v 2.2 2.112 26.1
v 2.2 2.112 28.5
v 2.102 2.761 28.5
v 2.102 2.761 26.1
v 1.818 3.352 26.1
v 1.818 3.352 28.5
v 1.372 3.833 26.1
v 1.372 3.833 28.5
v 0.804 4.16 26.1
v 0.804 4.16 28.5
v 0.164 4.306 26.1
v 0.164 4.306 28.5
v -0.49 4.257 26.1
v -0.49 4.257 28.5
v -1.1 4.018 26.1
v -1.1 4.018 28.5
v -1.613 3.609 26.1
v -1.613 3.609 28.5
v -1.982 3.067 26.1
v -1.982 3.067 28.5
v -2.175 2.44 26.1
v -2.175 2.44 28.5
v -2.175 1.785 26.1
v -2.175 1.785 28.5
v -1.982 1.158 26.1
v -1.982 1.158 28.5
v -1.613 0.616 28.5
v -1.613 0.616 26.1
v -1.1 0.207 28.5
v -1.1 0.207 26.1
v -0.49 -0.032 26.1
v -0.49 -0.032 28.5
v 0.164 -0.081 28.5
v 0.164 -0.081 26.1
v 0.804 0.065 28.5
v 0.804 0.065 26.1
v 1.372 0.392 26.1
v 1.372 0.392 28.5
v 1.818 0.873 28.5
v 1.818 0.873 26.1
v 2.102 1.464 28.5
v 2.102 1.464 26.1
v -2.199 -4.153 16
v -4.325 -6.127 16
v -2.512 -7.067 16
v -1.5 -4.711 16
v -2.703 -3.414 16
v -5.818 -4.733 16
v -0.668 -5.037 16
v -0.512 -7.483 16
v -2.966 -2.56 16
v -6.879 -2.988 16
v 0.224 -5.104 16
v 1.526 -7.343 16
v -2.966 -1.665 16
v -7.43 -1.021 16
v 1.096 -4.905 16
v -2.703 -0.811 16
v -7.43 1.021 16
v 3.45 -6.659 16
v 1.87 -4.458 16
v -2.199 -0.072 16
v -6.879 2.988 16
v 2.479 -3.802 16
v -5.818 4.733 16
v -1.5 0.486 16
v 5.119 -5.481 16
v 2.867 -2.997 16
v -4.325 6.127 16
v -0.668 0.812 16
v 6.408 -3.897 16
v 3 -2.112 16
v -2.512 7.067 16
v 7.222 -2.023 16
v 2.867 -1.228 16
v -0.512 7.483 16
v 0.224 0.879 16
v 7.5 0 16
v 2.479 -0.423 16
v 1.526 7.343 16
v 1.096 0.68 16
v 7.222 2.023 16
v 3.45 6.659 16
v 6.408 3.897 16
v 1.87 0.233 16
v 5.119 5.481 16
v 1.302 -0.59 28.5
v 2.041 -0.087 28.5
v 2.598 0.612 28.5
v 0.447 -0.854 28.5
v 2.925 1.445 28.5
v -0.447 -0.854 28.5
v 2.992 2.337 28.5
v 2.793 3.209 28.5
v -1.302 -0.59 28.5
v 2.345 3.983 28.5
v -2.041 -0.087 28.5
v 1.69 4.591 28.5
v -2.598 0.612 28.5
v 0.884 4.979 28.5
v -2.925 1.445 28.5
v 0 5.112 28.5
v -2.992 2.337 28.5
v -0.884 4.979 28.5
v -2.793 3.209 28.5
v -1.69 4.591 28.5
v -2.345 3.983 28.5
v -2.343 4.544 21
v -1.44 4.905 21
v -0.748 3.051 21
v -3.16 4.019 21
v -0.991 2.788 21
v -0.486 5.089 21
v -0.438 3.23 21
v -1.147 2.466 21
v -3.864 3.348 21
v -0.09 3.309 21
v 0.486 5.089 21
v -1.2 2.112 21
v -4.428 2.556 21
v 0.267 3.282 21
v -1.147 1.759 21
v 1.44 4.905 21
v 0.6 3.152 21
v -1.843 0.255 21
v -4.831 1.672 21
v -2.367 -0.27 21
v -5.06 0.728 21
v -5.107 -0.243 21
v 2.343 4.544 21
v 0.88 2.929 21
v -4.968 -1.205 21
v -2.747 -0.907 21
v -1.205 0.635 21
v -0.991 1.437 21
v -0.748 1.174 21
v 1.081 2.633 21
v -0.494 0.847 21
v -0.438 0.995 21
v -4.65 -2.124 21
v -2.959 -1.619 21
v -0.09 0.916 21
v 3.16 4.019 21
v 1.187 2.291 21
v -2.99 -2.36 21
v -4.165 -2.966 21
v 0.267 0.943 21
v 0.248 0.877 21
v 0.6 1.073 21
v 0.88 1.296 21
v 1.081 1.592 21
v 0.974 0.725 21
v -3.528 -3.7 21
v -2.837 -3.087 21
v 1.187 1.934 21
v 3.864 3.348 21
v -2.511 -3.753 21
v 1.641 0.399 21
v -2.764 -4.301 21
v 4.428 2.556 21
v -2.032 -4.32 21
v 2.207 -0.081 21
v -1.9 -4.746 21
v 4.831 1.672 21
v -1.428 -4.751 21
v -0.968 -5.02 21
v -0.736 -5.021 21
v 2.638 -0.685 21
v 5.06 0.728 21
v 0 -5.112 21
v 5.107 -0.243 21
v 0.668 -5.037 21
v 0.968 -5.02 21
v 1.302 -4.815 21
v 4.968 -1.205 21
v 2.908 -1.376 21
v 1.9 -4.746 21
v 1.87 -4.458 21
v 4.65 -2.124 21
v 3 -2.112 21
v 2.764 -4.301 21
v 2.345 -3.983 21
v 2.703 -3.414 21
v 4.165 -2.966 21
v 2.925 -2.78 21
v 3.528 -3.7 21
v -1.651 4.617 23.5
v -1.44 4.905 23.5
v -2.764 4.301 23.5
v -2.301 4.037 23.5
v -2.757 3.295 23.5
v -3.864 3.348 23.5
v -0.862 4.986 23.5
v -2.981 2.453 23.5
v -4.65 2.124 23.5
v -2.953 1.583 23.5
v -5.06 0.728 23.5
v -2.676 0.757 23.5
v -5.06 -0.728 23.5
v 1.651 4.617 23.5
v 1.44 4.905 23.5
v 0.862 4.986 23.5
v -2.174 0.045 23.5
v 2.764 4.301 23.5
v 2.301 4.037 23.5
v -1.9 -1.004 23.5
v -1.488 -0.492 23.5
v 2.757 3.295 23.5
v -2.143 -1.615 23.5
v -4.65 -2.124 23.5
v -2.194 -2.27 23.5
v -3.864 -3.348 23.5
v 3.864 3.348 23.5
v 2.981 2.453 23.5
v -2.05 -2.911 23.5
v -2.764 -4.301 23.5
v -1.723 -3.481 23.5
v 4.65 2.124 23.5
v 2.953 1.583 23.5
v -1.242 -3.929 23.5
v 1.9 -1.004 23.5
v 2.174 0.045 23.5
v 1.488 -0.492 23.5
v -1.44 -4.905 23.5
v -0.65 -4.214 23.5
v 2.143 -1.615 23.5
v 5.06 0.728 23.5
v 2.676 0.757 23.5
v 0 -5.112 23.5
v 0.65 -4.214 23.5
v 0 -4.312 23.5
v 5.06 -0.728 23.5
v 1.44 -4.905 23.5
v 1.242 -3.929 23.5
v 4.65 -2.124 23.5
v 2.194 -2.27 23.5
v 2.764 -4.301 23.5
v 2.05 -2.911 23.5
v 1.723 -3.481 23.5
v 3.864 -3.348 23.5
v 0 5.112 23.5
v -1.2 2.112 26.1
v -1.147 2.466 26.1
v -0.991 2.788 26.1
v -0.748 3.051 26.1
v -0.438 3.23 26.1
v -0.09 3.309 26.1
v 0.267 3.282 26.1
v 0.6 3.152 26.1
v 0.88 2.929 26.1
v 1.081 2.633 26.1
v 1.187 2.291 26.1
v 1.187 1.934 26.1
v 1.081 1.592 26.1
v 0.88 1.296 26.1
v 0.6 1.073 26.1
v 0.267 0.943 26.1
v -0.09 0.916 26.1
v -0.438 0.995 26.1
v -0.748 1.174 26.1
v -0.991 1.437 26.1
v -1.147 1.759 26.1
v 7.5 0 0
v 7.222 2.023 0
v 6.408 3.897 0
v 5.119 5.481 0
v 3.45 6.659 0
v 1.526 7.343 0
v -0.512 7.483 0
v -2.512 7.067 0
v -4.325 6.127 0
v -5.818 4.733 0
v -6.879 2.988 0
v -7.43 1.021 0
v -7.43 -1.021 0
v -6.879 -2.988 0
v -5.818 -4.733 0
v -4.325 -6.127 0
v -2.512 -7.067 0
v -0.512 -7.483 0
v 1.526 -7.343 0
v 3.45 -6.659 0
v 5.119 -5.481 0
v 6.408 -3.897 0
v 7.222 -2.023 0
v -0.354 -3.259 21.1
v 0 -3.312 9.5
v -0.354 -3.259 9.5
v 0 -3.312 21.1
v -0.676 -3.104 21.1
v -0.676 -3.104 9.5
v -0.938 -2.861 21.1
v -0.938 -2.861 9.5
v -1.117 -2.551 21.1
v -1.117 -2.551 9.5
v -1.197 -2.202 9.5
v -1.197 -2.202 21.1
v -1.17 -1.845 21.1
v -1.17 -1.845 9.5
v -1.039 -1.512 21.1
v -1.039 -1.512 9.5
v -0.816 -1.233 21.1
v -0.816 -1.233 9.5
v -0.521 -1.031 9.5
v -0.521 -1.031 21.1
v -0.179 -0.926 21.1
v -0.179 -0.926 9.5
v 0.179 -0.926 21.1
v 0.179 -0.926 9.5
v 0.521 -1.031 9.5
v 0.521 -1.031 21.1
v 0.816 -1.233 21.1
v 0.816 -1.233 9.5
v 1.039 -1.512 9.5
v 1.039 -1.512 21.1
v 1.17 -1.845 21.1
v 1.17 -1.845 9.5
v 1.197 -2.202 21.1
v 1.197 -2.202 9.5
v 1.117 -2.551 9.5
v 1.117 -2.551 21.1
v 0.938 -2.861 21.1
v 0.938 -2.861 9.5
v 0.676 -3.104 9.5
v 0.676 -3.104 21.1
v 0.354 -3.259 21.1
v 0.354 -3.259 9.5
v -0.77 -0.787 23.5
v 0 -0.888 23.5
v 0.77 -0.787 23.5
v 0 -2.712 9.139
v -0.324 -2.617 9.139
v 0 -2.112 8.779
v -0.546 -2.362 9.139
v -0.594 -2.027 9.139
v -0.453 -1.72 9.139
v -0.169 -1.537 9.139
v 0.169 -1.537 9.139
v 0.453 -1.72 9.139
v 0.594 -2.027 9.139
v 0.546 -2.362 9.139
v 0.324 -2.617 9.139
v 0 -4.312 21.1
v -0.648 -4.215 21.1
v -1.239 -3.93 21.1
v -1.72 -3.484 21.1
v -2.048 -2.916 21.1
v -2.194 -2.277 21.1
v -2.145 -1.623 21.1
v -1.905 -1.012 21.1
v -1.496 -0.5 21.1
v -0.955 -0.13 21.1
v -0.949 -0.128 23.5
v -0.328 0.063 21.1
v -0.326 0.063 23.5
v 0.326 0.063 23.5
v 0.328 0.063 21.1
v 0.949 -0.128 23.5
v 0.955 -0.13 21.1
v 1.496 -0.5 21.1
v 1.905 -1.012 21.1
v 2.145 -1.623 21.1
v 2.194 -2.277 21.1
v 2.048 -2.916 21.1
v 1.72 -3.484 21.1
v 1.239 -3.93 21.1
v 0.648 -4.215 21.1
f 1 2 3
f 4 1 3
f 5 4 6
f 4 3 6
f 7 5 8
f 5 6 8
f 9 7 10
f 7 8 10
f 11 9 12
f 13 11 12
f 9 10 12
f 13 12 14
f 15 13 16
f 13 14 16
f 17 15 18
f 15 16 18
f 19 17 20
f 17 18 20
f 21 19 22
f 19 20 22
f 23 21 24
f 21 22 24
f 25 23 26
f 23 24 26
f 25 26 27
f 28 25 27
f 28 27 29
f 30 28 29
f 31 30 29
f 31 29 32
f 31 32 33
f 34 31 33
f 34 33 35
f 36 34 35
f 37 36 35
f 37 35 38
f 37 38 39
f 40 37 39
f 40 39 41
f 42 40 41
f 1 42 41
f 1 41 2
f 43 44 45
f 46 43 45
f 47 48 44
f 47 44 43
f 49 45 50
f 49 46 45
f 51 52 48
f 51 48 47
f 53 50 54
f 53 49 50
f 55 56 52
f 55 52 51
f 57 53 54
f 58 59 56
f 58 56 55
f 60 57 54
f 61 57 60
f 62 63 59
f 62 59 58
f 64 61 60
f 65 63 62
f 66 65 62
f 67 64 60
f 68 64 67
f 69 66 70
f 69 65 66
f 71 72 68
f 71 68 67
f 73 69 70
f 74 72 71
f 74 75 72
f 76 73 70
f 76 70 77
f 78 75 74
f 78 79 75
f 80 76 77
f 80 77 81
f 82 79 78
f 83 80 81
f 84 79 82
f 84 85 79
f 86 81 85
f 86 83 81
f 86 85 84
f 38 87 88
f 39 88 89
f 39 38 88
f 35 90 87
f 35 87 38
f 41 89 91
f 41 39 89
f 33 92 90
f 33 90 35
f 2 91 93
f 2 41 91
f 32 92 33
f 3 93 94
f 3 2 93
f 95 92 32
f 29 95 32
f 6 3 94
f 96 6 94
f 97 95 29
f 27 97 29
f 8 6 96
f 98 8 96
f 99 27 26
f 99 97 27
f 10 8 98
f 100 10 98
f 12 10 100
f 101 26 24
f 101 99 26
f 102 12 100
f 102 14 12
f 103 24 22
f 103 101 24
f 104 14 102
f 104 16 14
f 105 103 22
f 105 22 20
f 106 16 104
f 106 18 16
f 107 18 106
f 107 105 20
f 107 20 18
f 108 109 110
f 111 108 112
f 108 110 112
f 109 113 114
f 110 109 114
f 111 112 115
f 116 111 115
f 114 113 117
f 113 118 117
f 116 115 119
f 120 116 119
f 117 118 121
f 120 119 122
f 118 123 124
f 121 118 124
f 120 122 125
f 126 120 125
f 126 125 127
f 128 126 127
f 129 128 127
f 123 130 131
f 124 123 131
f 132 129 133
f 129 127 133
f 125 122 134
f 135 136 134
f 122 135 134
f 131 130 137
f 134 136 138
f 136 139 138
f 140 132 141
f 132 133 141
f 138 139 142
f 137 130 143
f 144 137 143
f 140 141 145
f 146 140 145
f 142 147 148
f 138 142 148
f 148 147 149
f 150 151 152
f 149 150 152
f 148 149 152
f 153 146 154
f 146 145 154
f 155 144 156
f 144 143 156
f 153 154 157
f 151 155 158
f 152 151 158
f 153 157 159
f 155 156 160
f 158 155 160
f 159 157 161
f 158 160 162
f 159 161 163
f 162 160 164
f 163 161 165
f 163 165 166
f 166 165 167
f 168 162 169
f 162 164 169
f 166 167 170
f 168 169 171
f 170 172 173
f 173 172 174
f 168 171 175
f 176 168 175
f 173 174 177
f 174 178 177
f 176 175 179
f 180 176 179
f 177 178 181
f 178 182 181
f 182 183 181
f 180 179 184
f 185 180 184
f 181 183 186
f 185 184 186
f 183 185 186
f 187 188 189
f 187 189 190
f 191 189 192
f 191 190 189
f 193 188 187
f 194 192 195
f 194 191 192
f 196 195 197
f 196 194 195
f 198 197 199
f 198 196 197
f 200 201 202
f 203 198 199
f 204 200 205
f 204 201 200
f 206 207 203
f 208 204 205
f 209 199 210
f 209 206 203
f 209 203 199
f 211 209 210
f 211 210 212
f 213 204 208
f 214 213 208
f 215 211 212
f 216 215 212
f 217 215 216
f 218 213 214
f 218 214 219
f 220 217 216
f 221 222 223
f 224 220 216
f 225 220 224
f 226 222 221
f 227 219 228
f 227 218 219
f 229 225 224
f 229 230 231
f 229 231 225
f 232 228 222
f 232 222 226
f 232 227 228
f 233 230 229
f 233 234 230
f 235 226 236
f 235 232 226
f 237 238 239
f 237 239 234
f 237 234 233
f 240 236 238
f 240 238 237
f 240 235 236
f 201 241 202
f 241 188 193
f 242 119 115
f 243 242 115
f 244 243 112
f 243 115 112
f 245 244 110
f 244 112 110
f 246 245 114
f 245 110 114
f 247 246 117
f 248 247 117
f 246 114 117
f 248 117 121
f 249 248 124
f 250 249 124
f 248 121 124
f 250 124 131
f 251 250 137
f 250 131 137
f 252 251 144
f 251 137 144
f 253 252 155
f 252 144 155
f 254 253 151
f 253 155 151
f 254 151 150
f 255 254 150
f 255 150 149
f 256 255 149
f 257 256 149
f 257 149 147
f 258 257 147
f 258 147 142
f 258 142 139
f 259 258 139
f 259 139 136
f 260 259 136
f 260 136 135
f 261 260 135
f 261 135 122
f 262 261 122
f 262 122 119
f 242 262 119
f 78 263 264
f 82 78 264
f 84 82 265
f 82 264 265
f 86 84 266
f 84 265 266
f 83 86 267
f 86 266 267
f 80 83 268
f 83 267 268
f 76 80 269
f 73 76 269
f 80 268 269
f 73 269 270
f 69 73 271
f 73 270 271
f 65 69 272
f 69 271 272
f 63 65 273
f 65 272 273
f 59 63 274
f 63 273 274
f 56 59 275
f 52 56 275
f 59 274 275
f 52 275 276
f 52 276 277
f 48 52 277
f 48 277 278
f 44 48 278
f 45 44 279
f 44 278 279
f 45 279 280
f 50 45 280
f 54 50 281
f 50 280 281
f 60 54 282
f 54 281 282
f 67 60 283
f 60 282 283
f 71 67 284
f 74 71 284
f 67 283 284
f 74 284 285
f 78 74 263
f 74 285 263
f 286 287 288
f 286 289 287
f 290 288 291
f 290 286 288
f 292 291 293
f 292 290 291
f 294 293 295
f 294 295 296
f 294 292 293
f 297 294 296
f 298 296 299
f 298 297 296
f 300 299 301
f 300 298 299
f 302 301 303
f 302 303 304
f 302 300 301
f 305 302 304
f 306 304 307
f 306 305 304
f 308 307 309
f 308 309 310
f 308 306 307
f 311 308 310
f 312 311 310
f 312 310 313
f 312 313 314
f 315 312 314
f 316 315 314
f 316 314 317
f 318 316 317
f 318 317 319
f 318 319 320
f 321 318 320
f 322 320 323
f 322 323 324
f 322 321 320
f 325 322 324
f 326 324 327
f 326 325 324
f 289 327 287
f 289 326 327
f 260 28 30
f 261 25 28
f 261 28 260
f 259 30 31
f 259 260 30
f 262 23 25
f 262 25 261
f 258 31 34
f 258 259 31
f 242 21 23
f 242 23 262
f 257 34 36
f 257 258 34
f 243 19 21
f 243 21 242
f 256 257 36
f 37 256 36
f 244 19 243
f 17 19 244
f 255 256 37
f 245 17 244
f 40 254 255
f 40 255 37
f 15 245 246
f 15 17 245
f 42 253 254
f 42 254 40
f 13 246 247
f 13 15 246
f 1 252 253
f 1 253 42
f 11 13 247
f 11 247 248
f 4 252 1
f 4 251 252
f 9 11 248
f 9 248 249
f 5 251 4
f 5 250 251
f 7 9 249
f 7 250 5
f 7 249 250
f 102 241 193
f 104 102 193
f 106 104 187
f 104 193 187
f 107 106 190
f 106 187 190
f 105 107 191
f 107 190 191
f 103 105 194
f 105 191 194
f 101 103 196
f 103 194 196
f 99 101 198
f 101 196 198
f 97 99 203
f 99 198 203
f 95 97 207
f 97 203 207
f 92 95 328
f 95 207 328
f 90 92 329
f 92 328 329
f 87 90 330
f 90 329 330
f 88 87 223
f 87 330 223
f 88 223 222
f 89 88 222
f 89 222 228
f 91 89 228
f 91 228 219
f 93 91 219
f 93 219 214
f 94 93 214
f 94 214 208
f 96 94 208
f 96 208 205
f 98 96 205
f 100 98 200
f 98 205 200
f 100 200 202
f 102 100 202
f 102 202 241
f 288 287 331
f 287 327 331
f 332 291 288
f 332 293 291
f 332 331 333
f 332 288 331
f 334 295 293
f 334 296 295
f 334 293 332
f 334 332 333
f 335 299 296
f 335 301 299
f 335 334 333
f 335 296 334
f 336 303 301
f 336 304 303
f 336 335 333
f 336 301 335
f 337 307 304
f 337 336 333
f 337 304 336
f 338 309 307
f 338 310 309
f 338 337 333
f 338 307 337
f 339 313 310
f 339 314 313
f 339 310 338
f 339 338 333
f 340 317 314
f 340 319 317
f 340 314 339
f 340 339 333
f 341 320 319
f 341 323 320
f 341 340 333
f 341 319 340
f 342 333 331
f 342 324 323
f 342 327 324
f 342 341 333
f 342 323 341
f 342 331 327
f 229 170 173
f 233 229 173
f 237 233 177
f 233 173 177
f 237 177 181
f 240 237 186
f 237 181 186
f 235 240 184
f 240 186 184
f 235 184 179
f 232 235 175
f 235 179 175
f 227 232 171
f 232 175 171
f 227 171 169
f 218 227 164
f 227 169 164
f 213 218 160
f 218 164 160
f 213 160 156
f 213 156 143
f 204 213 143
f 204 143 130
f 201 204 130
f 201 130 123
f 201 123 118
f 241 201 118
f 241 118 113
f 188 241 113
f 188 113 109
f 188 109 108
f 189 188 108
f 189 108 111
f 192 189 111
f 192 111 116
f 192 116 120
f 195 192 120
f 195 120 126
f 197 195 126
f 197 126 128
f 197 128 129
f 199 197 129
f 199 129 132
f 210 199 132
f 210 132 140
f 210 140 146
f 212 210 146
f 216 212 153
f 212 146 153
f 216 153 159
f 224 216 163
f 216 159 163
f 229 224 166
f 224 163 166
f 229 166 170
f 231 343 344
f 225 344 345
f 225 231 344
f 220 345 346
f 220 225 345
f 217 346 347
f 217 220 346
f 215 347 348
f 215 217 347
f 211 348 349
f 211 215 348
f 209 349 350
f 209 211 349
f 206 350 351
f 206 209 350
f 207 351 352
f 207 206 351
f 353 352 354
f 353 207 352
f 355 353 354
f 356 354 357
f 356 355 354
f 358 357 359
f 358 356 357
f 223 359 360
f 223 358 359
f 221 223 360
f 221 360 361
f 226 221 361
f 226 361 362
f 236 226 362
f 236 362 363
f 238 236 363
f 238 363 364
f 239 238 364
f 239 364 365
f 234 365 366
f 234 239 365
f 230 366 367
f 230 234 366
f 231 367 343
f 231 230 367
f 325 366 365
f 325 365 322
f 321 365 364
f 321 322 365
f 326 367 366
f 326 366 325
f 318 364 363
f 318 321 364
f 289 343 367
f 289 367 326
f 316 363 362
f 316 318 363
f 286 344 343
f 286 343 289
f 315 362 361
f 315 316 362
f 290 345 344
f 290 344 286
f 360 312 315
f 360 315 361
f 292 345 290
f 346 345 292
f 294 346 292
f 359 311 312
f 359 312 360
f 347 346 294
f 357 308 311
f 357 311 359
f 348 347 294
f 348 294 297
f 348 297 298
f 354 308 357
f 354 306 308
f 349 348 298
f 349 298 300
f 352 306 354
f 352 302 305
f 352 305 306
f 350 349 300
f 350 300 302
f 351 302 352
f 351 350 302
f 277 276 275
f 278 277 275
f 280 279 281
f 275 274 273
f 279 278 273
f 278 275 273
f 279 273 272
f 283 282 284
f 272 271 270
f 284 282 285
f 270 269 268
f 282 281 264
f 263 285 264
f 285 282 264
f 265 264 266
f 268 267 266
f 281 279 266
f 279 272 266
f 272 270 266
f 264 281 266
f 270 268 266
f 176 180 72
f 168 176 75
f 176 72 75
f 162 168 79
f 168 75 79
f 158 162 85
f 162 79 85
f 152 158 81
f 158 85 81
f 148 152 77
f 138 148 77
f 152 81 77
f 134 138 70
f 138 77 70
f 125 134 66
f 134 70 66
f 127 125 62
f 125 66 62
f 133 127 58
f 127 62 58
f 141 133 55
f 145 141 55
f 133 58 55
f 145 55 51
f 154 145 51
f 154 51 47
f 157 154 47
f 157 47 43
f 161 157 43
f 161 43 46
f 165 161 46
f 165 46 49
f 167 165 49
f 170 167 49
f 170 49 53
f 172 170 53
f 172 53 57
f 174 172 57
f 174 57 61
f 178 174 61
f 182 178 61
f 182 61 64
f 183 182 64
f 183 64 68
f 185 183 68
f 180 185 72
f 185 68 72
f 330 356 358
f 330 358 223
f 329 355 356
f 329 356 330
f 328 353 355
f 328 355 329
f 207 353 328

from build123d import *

# Parameters (mm, degrees)
SKETCH1_R                                           = 7.5
BOSS_EXTRUDE1_DEPTH                                 = 16
SKETCH2_R                                           = 3
BOSS_EXTRUDE2_DEPTH                                 = 5
SKETCH3_R                                           = 5.1125
BOSS_EXTRUDE3_DEPTH                                 = 2.5
SKETCH5_R                                           = 3
BOSS_EXTRUDE4_DEPTH                                 = 5
CBORE_FOR_M2_HEX_SOCKET_HEAD_CAP_SCREW1_D           = 2.4
CBORE_FOR_M2_HEX_SOCKET_HEAD_CAP_SCREW1_DEPTH       = 7.5
CBORE_FOR_M2_HEX_SOCKET_HEAD_CAP_SCREW1_CBORE_D     = 4.4
CBORE_FOR_M2_HEX_SOCKET_HEAD_CAP_SCREW1_CBORE_DEPTH = 2.4


with BuildPart() as part:
    # Sketch1 → Boss-Extrude1 (new body)
    with BuildSketch(Plane.XY):
        Circle(SKETCH1_R)
    extrude(amount=BOSS_EXTRUDE1_DEPTH)

    # Sketch2 → Boss-Extrude2 (add)
    with BuildSketch(Plane.XY.offset(16)):
        with Locations((0, -2.1125)):
            Circle(SKETCH2_R)
    extrude(amount=BOSS_EXTRUDE2_DEPTH)

    # Sketch3 → Boss-Extrude3 (add)
    with BuildSketch(Plane.XY.offset(21)):
        with Locations(Location((0, 0, 0), (0, 0, 270))):
            Circle(SKETCH3_R)
    extrude(amount=BOSS_EXTRUDE3_DEPTH)

    # Sketch5 → Boss-Extrude4 (add)
    with BuildSketch(Plane.XY.offset(23.5)):
        with Locations(Location((0, 2.1125, 0), (0, 0, 90))):
            Circle(SKETCH5_R)
    extrude(amount=BOSS_EXTRUDE4_DEPTH)

    # CBORE for M2 Hex Socket Head Cap Screw1
    with Locations(Plane.XY.offset(28.5)):
        with Locations((0, 2.1125)):
            CounterBoreHole(CBORE_FOR_M2_HEX_SOCKET_HEAD_CAP_SCREW1_D / 2, CBORE_FOR_M2_HEX_SOCKET_HEAD_CAP_SCREW1_CBORE_D / 2, CBORE_FOR_M2_HEX_SOCKET_HEAD_CAP_SCREW1_CBORE_DEPTH, depth=CBORE_FOR_M2_HEX_SOCKET_HEAD_CAP_SCREW1_DEPTH)

    # Sketch10 → CBORE for M2 Hex Socket Head Cap Screw2 (revolve, cut)
    with BuildSketch(Plane(origin=(0, -2.1125, 23.5), x_dir=(0, -1, 0), z_dir=(1, 0, 0))):
        Polygon((0, 0), (0, 14.721032743), (1.2, 14), (1.2, 2.4), (2.2, 2.4), (2.2, 0), align=None)
    revolve(axis=Axis((0, -2.1125, 29.85), (0, 0, -1)), mode=Mode.SUBTRACT)


solid = part.part
